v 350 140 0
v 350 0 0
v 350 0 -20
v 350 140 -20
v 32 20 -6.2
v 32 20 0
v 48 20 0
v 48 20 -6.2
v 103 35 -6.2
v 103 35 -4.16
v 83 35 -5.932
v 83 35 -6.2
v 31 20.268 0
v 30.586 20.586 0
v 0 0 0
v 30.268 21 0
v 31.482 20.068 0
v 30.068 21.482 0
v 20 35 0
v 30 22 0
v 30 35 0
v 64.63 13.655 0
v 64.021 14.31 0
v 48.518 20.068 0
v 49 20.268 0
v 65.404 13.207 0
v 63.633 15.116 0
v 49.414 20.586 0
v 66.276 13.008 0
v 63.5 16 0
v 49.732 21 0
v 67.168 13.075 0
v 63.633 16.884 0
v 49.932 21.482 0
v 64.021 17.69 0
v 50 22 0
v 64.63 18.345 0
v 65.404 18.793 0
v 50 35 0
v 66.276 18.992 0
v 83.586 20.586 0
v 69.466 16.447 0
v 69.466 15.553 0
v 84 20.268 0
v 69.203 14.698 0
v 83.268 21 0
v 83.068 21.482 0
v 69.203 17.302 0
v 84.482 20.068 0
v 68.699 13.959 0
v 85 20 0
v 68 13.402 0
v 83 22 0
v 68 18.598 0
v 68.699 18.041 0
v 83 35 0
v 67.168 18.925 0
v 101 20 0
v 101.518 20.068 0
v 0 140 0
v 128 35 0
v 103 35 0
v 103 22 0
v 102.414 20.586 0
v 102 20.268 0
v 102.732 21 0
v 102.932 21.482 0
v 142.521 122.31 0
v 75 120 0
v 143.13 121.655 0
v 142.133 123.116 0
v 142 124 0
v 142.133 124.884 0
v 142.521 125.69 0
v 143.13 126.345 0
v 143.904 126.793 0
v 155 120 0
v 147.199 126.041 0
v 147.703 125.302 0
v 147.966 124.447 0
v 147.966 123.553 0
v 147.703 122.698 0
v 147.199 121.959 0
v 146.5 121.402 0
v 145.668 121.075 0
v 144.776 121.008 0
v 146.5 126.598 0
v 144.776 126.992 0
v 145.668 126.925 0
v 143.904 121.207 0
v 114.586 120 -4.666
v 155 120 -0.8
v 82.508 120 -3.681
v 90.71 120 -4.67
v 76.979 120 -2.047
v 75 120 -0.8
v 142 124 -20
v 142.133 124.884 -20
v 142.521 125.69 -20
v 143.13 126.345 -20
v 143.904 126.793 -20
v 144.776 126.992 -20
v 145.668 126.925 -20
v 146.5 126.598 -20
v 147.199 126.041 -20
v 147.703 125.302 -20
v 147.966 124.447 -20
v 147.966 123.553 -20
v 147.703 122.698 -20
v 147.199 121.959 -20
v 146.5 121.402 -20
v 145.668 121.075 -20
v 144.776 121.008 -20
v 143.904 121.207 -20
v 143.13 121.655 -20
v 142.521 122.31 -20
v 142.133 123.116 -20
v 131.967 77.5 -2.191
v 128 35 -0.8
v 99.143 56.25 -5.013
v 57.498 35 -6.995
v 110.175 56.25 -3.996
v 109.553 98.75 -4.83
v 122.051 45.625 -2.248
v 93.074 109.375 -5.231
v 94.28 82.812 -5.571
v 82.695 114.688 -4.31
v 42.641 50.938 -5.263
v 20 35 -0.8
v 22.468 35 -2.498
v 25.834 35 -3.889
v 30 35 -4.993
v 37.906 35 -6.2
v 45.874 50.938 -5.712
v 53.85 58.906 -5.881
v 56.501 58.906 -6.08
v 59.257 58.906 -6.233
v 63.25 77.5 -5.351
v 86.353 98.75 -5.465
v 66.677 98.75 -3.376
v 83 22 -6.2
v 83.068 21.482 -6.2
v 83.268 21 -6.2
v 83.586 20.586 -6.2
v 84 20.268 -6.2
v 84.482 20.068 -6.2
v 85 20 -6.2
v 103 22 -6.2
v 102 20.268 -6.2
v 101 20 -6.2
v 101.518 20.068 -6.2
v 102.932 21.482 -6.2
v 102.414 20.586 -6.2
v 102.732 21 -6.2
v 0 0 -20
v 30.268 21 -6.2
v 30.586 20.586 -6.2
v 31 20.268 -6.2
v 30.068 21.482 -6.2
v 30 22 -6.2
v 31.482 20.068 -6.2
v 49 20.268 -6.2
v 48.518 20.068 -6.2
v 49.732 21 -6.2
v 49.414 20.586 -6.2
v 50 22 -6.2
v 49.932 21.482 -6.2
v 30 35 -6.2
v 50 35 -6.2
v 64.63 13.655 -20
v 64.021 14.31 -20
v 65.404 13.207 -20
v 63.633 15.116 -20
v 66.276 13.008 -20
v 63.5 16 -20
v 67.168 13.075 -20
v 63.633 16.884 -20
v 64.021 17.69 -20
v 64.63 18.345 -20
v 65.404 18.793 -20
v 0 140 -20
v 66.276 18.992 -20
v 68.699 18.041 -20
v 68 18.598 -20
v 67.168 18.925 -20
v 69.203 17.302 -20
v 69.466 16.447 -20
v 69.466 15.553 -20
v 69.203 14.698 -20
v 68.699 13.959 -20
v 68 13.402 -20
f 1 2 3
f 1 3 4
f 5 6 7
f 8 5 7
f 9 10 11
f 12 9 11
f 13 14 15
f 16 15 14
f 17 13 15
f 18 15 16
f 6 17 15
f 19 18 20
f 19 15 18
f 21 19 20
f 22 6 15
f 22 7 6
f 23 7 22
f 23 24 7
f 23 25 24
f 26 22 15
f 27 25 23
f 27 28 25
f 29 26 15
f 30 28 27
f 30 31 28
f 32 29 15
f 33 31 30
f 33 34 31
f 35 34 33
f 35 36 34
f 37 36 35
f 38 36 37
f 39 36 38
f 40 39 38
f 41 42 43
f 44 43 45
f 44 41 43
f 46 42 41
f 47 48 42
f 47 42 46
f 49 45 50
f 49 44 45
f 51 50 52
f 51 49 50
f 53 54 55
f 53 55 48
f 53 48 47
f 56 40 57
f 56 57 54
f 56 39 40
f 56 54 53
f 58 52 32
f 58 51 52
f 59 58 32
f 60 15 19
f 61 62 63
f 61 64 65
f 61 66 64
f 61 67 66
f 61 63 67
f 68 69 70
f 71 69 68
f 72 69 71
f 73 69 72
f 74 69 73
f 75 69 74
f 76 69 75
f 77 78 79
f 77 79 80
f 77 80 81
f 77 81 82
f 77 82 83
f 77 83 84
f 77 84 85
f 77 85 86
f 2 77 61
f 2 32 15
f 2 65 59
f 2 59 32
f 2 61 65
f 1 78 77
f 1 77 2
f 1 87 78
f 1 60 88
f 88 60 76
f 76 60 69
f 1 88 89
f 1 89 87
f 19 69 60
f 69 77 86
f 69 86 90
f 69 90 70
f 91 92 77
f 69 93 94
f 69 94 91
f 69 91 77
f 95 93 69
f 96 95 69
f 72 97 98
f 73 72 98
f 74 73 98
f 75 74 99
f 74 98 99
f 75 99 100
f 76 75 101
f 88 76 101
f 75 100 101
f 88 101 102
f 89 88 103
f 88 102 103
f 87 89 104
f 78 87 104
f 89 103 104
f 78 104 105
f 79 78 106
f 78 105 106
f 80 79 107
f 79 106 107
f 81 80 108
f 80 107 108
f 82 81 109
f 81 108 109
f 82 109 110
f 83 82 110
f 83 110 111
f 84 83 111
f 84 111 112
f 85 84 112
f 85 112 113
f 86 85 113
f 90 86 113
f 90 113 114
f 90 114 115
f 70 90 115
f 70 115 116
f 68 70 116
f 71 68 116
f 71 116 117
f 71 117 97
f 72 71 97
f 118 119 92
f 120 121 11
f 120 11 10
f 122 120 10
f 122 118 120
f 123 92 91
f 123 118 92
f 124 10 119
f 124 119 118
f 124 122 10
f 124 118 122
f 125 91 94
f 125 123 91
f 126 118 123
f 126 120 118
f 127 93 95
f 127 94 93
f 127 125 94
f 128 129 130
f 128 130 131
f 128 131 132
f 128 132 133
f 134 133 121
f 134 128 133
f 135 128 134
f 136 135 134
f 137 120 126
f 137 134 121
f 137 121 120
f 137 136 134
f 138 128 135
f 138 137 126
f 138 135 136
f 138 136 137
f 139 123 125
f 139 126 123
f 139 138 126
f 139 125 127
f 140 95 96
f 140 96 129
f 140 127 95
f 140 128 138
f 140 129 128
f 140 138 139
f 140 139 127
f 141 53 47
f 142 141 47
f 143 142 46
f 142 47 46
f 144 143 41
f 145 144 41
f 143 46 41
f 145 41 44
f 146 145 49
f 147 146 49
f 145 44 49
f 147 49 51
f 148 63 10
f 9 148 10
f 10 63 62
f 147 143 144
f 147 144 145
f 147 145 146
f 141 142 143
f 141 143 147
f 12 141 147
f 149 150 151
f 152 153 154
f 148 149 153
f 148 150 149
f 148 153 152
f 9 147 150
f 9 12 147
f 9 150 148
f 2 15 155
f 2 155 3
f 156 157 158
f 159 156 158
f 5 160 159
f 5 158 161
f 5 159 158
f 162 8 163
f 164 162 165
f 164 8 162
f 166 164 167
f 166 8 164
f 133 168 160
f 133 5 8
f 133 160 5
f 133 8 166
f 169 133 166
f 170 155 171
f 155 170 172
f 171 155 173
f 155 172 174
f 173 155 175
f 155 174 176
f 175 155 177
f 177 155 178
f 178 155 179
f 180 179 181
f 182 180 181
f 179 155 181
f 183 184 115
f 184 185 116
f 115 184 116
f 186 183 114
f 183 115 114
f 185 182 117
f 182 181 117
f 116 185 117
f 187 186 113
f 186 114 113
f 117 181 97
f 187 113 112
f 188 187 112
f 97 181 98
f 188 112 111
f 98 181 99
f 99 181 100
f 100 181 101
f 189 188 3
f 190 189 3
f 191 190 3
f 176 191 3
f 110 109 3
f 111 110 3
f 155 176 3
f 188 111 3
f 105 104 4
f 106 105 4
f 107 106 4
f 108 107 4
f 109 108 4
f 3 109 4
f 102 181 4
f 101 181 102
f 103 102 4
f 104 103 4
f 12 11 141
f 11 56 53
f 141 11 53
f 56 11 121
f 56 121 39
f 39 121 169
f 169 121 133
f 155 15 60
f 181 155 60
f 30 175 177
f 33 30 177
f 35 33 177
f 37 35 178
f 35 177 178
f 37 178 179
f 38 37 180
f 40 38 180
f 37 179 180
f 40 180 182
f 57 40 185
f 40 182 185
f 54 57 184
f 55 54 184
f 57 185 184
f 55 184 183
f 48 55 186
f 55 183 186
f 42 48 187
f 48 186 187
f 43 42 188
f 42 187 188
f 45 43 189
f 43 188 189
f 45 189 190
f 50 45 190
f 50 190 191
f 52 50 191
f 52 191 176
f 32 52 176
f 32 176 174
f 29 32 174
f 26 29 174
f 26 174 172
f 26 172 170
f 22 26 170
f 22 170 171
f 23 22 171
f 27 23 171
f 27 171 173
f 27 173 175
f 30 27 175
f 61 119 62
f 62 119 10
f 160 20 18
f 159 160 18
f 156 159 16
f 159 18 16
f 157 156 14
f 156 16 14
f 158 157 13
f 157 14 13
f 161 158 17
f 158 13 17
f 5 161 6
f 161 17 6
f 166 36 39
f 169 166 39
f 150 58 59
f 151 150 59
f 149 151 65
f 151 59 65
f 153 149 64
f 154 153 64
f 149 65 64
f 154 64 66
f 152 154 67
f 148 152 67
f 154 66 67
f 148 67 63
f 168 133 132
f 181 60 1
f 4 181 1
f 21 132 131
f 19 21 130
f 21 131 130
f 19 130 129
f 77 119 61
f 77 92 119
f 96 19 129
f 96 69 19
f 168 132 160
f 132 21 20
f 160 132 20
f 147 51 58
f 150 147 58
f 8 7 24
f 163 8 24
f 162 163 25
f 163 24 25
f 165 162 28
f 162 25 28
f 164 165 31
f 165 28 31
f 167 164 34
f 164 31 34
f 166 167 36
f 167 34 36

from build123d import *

# Parameters (mm, degrees)
F0_W     = 350
F0_H     = 140
F1_DEPTH = 20
F9_DEPTH = 6.2
F11_D    = 6


with BuildPart() as f1:
    # F0 (on Top) → F1 (new body)
    with BuildSketch(Plane.XY):
        with Locations((175, 70)):
            Rectangle(F0_W, F0_H)
    extrude(amount=-F1_DEPTH)

    # F4 (on plane+point) → F7 section 0
    with BuildSketch(Plane.XZ.offset(-35)):
        with BuildLine():
            Line((128, 0), (20, 0))
            Line((20, 0), (20, -0.8))
            add(Edge.make_bspline(
                [(20, -0.8), (33.539250493, -13.4811280295), (116.6631821028, -3.1675355221), (128, -0.8)],
                knots=[0, 0, 0, 0, 108, 108, 108, 108], degree=3))
            Line((128, -0.8), (128, 0))
        make_face()
    # F6 (on plane+point) → F7 section 1
    with BuildSketch(Plane.XZ.offset(-120)):
        with BuildLine():
            Line((155, 0), (75, 0))
            Line((75, 0), (75, -0.8))
            add(Edge.make_bspline(
                [(75, -0.8), (83.8186404567, -8.6791180032), (137.2789575916, -3.563235641), (155, -0.8)],
                knots=[0, 0, 0, 0, 80, 80, 80, 80], degree=3))
            Line((155, -0.8), (155, 0))
        make_face()
    loft(mode=Mode.SUBTRACT)

    # F8 (on Top) → F9 (cut)
    with BuildSketch(Plane.XY):
        with BuildLine():
            Line((50, 35), (30, 35))
            Line((30, 35), (30, 22))
            ThreePointArc((30, 22), (30.5857864376, 20.5857864376), (32, 20))
            Line((32, 20), (48, 20))
            ThreePointArc((48, 20), (49.4142135624, 20.5857864376), (50, 22))
            Line((50, 22), (50, 35))
        make_face()
        with BuildLine():
            Line((103, 35), (83, 35))
            Line((83, 35), (83, 22))
            ThreePointArc((83, 22), (83.5857864376, 20.5857864376), (85, 20))
            Line((85, 20), (101, 20))
            ThreePointArc((101, 20), (102.4142135624, 20.5857864376), (103, 22))
            Line((103, 22), (103, 35))
        make_face()
    extrude(amount=-F9_DEPTH, mode=Mode.SUBTRACT)

    # F11 (through all)
    with Locations(Plane.XY):
        with Locations((66.5, 16), (145, 124)):
            Hole(F11_D / 2)


solid = f1.part
